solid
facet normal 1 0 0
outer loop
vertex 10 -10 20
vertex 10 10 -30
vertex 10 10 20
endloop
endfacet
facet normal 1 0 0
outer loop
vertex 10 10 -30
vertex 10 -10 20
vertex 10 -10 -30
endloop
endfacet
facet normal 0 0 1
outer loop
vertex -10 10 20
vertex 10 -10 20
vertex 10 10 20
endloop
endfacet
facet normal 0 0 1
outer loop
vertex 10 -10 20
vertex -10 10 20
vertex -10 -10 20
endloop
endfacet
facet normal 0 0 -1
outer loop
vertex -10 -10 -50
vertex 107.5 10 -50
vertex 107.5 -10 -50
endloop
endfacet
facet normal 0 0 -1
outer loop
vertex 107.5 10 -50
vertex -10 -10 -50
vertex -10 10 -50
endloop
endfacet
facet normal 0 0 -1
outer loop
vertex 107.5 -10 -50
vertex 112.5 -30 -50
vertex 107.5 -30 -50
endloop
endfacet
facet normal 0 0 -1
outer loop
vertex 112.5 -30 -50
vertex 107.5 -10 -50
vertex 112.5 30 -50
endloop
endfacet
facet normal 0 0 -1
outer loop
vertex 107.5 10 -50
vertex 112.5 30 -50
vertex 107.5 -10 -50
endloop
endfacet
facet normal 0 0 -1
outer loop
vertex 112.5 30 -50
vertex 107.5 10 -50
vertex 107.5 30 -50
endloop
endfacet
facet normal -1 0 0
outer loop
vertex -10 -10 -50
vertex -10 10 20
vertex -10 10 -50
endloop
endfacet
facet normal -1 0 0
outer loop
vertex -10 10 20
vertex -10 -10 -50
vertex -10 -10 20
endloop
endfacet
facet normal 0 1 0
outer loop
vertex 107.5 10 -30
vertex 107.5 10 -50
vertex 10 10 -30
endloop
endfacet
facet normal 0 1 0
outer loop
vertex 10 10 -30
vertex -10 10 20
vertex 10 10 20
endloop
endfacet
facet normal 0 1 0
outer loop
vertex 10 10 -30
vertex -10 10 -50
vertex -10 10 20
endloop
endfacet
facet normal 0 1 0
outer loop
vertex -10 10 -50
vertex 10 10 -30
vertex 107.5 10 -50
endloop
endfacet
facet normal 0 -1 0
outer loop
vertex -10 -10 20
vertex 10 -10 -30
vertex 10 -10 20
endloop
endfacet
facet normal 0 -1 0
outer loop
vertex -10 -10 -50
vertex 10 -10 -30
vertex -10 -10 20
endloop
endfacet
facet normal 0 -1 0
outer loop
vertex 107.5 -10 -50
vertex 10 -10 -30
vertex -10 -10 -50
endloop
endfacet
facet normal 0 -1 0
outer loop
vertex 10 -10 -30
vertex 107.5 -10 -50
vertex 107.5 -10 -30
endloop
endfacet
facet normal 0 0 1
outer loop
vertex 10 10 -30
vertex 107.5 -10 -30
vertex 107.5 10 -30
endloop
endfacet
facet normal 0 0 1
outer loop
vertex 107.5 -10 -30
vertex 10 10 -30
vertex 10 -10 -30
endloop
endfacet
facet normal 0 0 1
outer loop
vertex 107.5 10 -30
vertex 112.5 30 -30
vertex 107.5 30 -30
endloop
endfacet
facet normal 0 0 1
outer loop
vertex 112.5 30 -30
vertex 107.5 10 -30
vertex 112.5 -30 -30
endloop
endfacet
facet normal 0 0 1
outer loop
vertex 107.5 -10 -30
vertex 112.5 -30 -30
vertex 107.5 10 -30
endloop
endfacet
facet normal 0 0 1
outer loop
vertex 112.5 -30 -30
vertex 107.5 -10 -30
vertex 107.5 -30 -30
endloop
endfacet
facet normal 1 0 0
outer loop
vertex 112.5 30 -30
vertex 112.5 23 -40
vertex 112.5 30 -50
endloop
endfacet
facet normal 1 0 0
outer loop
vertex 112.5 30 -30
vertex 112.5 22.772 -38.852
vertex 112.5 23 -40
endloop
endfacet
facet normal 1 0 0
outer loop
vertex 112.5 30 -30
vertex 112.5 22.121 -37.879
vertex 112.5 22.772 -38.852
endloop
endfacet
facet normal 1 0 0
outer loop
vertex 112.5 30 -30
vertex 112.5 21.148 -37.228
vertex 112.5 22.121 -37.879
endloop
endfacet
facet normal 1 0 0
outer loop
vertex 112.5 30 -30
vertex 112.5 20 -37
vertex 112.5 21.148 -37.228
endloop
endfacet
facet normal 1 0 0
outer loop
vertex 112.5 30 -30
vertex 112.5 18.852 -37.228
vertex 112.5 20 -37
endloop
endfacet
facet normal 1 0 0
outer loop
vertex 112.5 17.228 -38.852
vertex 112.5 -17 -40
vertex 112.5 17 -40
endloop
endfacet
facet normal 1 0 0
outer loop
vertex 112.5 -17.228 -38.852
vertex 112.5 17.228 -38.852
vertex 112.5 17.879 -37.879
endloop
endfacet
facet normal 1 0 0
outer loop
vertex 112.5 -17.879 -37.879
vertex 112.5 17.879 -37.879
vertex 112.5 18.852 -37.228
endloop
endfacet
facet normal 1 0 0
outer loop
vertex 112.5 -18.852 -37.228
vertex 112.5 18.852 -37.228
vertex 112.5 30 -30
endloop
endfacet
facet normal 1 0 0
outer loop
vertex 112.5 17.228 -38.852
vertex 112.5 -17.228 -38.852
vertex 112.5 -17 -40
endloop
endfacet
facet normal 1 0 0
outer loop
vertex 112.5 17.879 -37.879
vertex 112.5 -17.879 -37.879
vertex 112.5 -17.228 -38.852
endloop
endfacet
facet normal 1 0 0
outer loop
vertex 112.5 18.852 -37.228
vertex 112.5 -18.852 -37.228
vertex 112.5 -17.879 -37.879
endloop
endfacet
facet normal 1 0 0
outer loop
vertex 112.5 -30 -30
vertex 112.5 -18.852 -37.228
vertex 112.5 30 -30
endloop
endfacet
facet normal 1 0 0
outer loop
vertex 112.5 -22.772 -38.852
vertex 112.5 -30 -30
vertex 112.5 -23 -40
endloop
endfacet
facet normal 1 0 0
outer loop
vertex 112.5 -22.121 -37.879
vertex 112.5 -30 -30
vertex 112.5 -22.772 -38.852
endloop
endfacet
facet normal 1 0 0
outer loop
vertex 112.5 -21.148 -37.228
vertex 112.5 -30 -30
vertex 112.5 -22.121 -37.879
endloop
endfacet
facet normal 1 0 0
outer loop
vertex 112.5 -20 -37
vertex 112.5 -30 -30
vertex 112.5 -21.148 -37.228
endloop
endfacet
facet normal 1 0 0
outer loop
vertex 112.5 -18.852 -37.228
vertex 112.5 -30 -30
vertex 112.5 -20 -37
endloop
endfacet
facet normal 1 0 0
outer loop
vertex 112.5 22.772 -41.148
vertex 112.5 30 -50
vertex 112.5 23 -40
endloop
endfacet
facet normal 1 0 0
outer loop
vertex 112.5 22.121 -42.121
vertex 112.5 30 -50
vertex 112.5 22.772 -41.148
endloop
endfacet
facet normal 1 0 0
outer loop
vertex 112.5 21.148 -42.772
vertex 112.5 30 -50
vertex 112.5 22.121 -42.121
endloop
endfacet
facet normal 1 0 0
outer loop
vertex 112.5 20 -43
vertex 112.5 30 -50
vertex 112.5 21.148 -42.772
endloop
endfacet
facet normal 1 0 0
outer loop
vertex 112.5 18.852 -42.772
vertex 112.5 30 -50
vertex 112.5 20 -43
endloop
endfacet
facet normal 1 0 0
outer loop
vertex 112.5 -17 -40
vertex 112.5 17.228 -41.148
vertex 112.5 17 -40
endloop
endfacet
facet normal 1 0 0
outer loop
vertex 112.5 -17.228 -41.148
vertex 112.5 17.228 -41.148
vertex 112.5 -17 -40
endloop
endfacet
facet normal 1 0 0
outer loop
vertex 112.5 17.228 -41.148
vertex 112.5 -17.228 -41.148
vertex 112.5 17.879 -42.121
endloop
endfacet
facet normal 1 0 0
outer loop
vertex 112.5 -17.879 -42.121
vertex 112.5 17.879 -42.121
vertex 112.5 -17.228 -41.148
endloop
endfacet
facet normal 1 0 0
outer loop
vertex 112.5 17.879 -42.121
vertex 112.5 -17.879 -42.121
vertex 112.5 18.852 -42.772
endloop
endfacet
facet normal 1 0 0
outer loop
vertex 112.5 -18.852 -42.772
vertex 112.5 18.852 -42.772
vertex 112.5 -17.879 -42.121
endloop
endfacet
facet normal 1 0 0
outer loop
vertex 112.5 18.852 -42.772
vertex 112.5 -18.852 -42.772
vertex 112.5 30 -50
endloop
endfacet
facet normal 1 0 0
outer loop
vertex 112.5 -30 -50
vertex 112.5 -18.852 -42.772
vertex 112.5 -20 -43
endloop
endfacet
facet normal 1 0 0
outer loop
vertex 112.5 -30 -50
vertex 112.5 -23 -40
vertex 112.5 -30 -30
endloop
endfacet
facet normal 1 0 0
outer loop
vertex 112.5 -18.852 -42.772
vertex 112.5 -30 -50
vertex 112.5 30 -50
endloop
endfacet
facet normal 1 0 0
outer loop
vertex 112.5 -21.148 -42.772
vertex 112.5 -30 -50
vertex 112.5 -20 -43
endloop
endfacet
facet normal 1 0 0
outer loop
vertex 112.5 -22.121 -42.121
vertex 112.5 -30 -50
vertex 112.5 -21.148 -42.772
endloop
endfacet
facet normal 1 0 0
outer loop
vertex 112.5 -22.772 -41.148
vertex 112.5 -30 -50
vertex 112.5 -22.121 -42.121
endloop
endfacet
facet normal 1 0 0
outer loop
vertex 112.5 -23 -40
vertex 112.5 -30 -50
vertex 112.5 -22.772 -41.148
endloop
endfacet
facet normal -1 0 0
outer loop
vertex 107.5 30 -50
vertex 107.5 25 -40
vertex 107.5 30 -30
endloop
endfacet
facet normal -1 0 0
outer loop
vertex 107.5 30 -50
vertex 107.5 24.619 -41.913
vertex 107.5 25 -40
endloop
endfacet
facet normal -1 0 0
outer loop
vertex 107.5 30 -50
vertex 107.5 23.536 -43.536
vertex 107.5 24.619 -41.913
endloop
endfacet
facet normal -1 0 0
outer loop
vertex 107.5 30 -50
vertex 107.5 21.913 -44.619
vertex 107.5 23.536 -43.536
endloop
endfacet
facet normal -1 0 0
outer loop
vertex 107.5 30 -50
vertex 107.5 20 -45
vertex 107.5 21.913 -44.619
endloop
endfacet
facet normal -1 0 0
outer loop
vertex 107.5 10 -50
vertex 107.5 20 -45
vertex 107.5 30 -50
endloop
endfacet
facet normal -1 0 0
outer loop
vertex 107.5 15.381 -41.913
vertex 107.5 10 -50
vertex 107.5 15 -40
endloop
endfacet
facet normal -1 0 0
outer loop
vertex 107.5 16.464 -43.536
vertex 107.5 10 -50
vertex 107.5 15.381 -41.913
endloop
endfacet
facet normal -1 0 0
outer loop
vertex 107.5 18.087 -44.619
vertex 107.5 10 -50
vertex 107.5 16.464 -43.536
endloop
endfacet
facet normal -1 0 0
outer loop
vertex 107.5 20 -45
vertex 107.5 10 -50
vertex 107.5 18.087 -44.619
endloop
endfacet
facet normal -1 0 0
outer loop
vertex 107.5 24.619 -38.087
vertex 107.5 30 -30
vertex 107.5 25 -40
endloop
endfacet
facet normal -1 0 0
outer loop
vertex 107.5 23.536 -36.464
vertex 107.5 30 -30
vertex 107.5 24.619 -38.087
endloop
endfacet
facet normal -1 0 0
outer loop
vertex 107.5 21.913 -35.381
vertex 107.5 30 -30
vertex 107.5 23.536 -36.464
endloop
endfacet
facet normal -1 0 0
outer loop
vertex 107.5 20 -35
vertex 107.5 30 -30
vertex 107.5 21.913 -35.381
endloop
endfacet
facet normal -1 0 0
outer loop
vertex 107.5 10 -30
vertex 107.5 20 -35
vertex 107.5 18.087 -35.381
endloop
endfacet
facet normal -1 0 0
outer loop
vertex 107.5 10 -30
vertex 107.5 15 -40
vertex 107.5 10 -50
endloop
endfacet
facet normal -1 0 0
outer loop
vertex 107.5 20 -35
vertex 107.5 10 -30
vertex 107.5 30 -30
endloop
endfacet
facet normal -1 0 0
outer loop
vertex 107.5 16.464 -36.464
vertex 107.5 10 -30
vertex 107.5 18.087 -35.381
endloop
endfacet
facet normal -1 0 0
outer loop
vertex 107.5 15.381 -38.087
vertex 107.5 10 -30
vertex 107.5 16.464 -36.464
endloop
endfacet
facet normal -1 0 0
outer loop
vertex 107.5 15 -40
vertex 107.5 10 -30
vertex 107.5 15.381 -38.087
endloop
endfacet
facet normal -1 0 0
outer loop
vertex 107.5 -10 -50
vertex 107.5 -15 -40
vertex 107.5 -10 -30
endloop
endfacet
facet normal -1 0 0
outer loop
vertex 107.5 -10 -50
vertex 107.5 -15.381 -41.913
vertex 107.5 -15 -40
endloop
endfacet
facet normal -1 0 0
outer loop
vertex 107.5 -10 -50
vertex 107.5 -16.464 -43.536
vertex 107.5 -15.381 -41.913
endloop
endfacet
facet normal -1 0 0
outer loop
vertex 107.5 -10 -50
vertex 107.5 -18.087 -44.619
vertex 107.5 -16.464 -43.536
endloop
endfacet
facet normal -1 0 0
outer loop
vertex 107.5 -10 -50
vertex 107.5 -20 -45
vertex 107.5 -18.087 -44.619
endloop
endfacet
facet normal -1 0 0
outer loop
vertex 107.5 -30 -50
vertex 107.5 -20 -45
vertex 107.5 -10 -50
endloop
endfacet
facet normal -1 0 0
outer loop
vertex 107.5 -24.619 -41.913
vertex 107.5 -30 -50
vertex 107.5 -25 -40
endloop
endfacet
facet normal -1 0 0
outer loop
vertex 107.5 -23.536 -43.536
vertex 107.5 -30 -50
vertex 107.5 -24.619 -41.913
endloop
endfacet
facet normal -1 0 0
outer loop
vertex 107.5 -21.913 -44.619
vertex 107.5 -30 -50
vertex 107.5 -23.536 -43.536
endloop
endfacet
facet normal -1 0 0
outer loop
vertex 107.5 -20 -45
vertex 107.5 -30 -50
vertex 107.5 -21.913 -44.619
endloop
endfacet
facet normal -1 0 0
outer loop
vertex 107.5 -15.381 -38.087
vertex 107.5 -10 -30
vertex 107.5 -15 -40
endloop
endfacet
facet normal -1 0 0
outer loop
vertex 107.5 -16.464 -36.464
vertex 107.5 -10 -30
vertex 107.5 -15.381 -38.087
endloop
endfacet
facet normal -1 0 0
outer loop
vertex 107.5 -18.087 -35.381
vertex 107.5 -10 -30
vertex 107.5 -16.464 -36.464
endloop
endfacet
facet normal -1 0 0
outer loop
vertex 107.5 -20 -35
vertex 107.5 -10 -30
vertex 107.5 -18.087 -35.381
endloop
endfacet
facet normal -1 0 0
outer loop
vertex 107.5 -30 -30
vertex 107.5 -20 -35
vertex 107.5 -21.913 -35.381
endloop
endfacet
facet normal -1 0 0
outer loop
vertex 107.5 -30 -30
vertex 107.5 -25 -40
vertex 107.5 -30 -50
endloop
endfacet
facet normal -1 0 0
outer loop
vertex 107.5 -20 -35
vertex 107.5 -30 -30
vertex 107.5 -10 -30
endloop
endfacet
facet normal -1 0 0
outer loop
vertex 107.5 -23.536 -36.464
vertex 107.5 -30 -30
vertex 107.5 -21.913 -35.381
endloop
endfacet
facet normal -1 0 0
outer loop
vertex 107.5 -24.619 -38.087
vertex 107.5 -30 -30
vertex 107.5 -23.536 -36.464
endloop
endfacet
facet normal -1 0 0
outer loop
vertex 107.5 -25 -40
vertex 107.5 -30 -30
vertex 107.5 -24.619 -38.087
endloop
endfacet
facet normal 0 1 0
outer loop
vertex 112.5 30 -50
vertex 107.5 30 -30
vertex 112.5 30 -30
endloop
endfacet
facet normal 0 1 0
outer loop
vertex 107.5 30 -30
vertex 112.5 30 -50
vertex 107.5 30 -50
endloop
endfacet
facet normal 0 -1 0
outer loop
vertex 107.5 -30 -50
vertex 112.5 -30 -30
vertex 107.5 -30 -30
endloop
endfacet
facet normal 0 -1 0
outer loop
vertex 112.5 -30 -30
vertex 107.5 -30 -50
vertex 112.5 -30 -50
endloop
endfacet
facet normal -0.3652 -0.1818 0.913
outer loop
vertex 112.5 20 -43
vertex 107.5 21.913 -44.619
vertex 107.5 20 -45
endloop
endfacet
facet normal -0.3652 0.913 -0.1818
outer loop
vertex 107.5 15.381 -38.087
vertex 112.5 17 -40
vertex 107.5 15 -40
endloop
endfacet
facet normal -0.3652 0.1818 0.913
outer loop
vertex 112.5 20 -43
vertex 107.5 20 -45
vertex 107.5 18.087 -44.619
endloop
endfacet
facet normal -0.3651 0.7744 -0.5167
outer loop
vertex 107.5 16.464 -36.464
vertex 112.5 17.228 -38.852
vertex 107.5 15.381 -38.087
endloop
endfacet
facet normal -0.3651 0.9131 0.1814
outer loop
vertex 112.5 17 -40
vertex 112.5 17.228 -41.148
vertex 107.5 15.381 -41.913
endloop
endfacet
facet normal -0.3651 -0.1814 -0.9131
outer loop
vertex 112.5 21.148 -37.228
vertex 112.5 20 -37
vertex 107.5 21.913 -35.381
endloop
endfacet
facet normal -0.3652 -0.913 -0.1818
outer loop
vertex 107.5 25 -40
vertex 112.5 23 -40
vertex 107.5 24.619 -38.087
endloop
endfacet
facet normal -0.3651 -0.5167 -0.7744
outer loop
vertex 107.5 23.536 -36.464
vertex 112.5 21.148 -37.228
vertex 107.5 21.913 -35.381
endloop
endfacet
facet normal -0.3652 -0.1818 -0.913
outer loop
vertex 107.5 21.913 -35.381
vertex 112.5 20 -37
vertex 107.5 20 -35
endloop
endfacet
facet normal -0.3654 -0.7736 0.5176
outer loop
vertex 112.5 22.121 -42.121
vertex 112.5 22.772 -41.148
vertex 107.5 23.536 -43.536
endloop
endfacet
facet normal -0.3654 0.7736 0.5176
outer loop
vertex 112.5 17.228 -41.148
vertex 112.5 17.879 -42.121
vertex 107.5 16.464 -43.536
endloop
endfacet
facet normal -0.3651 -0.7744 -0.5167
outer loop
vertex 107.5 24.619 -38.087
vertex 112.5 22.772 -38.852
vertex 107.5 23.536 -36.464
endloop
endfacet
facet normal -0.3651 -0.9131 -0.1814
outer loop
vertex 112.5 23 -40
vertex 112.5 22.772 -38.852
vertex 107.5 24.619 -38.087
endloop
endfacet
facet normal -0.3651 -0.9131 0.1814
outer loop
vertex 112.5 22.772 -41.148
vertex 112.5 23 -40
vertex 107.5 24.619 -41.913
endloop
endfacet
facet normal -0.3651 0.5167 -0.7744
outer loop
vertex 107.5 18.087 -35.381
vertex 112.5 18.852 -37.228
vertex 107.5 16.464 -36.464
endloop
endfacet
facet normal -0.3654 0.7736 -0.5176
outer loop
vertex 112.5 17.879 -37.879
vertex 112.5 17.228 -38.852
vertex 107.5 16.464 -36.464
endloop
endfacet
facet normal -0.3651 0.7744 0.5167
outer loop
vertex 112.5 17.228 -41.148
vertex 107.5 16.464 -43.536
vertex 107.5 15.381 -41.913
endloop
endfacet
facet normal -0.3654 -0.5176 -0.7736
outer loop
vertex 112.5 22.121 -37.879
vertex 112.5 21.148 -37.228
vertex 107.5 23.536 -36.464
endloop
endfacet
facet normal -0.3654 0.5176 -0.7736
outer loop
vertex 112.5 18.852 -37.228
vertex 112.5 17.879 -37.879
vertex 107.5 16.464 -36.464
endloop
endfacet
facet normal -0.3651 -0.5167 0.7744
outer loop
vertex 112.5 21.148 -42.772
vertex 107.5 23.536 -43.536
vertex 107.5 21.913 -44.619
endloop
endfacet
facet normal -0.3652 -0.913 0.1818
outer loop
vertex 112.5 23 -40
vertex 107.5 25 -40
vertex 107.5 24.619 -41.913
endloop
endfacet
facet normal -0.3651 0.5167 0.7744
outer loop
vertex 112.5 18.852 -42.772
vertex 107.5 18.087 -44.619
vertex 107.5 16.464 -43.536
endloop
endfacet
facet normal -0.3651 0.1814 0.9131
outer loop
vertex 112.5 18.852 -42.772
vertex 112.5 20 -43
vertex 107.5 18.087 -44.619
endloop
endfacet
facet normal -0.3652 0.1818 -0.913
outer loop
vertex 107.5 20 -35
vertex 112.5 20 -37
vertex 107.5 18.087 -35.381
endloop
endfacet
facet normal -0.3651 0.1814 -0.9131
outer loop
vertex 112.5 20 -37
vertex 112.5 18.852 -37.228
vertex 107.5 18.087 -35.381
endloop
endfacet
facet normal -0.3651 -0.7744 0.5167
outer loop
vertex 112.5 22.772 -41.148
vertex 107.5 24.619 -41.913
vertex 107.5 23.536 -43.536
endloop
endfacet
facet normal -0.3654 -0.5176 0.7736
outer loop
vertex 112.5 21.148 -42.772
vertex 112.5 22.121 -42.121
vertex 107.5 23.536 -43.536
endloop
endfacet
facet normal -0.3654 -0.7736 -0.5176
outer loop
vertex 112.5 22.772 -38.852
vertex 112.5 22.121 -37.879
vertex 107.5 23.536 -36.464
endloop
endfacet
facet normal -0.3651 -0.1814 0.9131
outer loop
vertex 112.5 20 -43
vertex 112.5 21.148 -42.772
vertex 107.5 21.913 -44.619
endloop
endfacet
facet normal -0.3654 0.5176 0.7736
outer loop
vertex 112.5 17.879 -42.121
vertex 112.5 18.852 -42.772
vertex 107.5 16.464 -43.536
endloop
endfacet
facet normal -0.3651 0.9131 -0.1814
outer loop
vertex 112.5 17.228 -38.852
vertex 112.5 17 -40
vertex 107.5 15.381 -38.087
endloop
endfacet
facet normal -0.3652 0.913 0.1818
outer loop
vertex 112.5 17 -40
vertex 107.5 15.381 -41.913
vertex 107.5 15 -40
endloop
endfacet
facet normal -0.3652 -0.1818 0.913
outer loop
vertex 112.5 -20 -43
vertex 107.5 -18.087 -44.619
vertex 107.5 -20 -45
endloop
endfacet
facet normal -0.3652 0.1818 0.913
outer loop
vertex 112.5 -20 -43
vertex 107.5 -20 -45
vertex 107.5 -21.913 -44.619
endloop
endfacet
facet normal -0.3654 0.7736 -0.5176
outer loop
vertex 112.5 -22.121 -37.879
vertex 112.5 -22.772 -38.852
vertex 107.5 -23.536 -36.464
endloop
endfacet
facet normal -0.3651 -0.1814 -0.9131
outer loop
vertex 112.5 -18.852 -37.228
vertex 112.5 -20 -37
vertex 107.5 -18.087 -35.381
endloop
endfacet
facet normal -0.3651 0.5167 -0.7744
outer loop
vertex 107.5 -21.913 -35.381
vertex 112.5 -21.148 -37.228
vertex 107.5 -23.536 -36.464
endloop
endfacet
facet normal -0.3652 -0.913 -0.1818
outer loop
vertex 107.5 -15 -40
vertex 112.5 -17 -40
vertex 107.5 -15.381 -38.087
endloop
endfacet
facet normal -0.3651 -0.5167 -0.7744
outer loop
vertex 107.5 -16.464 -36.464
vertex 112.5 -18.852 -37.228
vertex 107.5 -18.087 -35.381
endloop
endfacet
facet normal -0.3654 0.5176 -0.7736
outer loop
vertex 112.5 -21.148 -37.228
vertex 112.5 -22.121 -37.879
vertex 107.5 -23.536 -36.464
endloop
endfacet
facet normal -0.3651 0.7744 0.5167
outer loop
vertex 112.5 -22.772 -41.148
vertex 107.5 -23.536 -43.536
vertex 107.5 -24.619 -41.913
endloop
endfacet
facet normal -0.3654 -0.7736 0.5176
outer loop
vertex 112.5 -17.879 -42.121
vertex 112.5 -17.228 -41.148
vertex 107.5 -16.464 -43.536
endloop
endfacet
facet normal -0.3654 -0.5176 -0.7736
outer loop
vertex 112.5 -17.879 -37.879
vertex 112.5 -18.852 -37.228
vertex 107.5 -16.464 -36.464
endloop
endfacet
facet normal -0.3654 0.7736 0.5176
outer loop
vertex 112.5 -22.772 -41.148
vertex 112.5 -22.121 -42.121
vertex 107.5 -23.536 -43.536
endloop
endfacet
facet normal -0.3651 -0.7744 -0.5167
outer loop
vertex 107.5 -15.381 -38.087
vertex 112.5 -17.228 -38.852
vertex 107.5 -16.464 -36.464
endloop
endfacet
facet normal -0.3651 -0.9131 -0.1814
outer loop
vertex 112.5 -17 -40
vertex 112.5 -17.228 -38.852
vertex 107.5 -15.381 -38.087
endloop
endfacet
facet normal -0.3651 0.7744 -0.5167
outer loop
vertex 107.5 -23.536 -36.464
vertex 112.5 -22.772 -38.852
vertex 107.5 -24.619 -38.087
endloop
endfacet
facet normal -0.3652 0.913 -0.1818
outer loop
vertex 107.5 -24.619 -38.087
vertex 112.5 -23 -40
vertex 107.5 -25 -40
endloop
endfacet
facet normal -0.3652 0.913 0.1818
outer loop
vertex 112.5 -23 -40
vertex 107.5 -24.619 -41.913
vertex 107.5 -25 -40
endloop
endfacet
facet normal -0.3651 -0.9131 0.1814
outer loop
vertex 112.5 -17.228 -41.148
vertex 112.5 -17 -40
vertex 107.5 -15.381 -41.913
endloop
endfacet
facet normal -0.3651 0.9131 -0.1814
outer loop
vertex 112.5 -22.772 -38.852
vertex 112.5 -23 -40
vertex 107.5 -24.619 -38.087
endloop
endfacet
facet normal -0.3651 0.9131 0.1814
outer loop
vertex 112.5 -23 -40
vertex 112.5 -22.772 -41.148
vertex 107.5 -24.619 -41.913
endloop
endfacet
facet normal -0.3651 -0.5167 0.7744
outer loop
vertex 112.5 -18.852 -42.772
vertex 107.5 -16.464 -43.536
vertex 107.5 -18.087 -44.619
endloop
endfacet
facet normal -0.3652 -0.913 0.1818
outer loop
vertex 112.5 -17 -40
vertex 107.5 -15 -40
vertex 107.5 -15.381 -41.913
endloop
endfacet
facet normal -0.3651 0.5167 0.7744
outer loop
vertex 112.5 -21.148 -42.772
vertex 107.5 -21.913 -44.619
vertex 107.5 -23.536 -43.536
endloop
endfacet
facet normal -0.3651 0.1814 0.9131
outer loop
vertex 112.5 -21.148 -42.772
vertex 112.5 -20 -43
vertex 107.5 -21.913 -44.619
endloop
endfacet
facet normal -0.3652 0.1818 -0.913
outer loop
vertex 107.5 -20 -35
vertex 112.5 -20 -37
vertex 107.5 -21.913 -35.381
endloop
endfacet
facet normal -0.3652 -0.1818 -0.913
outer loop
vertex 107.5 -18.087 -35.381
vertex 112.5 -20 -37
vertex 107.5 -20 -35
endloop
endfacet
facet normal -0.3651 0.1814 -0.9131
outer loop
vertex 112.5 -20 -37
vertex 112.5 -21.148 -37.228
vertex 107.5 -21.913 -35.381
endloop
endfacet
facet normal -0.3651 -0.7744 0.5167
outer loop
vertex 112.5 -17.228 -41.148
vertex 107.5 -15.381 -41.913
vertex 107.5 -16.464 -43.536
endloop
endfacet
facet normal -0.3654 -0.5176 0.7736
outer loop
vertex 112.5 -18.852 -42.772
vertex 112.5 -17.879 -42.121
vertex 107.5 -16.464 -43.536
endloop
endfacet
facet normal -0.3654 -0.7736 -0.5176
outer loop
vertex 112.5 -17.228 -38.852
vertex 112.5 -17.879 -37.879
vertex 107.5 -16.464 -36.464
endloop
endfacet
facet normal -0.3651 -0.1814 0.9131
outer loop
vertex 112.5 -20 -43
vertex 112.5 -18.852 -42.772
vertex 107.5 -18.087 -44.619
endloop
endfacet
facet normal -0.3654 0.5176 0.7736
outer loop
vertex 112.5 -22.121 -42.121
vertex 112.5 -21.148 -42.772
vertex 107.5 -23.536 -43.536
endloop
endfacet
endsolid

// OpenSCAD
thicknessStand=20;

difference(){
  union(){
    translate([0,0,-15])cube([thicknessStand, thicknessStand, 70], true);
    translate([10+50,0,-40])cube([100, thicknessStand, thicknessStand], true);
    translate([110, 0, -40])cube([5, 3*thicknessStand, thicknessStand], true);
  }
  
  // Screw holes
  translate([110,20,-40])rotate([0,90,0])cylinder(r1=5, r2=3, h=5, center=true);
  translate([110,-20,-40])rotate([0,90,0])cylinder(r1=5, r2=3, h=5, center=true);
}
